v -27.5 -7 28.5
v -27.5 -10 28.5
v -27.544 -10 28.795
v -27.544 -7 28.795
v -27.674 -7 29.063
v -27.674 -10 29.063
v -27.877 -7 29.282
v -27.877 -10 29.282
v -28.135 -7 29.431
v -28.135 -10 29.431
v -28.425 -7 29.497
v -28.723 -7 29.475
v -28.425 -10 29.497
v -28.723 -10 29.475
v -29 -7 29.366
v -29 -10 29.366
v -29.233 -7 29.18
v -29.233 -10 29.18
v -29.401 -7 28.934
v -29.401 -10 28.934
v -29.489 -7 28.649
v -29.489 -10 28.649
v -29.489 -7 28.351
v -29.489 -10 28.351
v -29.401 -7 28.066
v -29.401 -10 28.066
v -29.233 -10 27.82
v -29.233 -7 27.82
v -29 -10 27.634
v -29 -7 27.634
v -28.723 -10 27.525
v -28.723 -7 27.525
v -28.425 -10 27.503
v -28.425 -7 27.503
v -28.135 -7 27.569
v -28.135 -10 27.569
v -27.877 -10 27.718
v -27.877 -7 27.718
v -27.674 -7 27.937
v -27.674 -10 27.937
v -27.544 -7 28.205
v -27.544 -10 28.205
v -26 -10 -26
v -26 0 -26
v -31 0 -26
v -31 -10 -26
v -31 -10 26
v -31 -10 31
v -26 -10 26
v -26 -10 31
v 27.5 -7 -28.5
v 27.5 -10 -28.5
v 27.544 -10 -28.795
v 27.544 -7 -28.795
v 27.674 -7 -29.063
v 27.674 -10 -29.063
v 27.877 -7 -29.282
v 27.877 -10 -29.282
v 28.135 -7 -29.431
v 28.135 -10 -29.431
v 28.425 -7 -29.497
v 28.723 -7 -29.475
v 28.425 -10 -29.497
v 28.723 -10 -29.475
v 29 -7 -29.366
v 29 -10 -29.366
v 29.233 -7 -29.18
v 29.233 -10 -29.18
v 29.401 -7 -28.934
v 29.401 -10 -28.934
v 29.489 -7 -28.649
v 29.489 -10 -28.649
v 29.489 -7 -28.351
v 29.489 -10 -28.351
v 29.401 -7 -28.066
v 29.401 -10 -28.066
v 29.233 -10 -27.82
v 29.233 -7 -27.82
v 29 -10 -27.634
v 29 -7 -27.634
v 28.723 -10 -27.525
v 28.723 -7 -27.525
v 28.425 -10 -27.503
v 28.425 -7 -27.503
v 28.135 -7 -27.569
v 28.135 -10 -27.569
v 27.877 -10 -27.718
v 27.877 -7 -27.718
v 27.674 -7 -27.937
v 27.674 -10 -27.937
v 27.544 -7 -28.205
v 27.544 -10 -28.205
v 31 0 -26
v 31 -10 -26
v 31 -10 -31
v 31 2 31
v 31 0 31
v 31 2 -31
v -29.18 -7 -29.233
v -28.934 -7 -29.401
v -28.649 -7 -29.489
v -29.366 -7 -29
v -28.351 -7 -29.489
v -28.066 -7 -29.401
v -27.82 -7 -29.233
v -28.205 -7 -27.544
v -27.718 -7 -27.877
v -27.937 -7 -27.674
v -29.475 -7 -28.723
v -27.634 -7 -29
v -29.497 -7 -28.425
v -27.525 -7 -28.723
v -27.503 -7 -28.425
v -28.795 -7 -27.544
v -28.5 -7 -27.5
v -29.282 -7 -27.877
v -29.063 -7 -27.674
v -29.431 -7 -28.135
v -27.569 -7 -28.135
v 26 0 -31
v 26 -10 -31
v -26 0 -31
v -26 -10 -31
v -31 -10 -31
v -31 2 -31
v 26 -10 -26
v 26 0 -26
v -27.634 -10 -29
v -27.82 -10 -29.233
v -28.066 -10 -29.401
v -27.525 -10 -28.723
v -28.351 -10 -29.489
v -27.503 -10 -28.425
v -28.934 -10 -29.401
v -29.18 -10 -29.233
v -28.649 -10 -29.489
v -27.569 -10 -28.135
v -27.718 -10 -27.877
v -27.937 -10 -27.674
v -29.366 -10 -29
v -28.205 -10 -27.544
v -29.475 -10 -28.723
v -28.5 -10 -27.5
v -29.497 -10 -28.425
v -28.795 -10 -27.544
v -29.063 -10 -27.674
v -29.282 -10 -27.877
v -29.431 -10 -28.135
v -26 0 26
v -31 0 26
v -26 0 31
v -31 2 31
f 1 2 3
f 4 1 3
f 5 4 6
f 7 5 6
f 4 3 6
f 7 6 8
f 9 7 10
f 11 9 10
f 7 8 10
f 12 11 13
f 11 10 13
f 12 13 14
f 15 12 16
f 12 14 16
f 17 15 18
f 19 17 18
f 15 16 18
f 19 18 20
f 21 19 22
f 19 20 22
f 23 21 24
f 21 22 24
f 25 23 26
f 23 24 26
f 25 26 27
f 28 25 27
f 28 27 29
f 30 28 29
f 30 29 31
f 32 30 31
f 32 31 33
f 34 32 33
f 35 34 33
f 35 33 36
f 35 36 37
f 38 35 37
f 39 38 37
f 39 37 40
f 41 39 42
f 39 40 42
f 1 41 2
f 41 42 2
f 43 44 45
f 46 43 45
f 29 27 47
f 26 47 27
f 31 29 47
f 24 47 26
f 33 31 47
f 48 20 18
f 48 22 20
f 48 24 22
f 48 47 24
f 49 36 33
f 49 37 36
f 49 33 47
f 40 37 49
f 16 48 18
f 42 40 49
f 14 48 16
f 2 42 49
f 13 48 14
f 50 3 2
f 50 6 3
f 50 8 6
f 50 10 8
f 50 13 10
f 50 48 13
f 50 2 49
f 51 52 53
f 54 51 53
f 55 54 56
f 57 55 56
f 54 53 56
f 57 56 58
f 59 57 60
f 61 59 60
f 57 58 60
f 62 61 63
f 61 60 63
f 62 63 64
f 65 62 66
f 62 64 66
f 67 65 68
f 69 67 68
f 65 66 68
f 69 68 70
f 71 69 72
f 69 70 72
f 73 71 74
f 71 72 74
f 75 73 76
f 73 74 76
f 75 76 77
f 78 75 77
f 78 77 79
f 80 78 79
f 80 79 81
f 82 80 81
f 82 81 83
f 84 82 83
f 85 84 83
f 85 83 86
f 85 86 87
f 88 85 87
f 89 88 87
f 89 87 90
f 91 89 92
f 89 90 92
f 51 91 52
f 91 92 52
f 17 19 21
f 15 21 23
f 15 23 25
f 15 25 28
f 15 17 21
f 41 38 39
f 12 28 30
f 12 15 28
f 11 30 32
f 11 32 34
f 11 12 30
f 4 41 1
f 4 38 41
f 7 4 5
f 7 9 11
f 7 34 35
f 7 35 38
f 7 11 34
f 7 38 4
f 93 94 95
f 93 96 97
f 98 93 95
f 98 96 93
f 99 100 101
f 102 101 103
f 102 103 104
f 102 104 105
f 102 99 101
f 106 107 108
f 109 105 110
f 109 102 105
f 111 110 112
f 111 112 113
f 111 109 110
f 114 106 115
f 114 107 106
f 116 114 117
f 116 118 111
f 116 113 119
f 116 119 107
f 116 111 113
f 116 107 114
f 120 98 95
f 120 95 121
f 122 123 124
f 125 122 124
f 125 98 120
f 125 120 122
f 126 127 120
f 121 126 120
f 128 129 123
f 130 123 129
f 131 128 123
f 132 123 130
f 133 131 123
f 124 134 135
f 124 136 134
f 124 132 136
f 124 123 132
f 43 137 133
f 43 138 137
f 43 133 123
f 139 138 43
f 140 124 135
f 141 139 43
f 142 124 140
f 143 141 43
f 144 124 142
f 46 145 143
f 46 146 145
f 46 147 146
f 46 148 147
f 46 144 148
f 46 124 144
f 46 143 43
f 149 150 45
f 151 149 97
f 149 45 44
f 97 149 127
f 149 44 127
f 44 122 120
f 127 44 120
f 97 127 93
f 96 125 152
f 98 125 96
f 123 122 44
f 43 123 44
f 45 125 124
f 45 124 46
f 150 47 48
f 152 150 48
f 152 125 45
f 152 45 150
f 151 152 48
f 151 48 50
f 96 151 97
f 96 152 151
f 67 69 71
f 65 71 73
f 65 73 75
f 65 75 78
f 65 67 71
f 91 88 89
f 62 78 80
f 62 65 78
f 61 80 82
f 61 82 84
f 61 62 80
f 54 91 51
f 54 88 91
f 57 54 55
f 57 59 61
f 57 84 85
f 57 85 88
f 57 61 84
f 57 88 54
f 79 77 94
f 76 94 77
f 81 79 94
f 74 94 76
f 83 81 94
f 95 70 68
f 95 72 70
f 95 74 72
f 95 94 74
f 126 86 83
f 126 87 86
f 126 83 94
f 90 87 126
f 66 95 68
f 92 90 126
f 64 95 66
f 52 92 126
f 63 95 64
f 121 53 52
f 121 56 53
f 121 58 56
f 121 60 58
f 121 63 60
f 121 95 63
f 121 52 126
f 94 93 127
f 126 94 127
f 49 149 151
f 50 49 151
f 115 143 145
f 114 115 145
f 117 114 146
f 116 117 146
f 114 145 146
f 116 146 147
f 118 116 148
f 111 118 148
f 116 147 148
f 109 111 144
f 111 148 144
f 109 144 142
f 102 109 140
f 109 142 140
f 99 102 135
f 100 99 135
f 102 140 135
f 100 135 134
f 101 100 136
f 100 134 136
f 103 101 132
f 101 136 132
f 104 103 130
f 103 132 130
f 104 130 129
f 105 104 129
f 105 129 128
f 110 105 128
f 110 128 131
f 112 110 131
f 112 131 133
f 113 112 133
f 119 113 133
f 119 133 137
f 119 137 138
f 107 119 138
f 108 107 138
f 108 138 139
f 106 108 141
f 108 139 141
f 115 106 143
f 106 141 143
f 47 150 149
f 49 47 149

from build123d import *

# Parameters (mm, degrees)
SKETCH2_W           = 62
SKETCH2_H           = 62
BOSS_EXTRUDE1_DEPTH = 2
SKETCH3_W           = 5
SKETCH3_H           = 5
BOSS_EXTRUDE2_DEPTH = 10
SKETCH6_R           = 1
CUT_EXTRUDE2_DEPTH  = 3
CIRPATTERN1_COUNT   = 3
CIRPATTERN1_ANGLE   = 180


with BuildPart() as part:
    # Sketch2 → Boss-Extrude1 (new body)
    with BuildSketch(Plane(origin=(0, 0, 0), x_dir=(1, 0, 0), z_dir=(0, 1, 0))):
        Rectangle(SKETCH2_W, SKETCH2_H)
    extrude(amount=BOSS_EXTRUDE1_DEPTH)

    # Sketch3 → Boss-Extrude2 (add)
    with BuildSketch(Plane.XZ):
        with Locations((-28.5, 28.5)):
            Rectangle(SKETCH3_W, SKETCH3_H)
    boss_extrude2 = extrude(amount=BOSS_EXTRUDE2_DEPTH)

    # Sketch6 → Cut-Extrude2 (cut)
    with BuildSketch(Plane.XZ.offset(10)):
        with Locations((-28.5, 28.5)):
            Circle(SKETCH6_R)
    cut_extrude2 = extrude(amount=-CUT_EXTRUDE2_DEPTH, mode=Mode.SUBTRACT)

    # CirPattern1: Boss-Extrude2, Cut-Extrude2 ×3 about axis
    cirpattern1_axis = Axis((0, 0, 0), (0, -1, 0))
    for i in range(1, CIRPATTERN1_COUNT):
        add(boss_extrude2.rotate(cirpattern1_axis, i * CIRPATTERN1_ANGLE / (CIRPATTERN1_COUNT - 1)))
        add(cut_extrude2.rotate(cirpattern1_axis, i * CIRPATTERN1_ANGLE / (CIRPATTERN1_COUNT - 1)), mode=Mode.SUBTRACT)


solid = part.part
